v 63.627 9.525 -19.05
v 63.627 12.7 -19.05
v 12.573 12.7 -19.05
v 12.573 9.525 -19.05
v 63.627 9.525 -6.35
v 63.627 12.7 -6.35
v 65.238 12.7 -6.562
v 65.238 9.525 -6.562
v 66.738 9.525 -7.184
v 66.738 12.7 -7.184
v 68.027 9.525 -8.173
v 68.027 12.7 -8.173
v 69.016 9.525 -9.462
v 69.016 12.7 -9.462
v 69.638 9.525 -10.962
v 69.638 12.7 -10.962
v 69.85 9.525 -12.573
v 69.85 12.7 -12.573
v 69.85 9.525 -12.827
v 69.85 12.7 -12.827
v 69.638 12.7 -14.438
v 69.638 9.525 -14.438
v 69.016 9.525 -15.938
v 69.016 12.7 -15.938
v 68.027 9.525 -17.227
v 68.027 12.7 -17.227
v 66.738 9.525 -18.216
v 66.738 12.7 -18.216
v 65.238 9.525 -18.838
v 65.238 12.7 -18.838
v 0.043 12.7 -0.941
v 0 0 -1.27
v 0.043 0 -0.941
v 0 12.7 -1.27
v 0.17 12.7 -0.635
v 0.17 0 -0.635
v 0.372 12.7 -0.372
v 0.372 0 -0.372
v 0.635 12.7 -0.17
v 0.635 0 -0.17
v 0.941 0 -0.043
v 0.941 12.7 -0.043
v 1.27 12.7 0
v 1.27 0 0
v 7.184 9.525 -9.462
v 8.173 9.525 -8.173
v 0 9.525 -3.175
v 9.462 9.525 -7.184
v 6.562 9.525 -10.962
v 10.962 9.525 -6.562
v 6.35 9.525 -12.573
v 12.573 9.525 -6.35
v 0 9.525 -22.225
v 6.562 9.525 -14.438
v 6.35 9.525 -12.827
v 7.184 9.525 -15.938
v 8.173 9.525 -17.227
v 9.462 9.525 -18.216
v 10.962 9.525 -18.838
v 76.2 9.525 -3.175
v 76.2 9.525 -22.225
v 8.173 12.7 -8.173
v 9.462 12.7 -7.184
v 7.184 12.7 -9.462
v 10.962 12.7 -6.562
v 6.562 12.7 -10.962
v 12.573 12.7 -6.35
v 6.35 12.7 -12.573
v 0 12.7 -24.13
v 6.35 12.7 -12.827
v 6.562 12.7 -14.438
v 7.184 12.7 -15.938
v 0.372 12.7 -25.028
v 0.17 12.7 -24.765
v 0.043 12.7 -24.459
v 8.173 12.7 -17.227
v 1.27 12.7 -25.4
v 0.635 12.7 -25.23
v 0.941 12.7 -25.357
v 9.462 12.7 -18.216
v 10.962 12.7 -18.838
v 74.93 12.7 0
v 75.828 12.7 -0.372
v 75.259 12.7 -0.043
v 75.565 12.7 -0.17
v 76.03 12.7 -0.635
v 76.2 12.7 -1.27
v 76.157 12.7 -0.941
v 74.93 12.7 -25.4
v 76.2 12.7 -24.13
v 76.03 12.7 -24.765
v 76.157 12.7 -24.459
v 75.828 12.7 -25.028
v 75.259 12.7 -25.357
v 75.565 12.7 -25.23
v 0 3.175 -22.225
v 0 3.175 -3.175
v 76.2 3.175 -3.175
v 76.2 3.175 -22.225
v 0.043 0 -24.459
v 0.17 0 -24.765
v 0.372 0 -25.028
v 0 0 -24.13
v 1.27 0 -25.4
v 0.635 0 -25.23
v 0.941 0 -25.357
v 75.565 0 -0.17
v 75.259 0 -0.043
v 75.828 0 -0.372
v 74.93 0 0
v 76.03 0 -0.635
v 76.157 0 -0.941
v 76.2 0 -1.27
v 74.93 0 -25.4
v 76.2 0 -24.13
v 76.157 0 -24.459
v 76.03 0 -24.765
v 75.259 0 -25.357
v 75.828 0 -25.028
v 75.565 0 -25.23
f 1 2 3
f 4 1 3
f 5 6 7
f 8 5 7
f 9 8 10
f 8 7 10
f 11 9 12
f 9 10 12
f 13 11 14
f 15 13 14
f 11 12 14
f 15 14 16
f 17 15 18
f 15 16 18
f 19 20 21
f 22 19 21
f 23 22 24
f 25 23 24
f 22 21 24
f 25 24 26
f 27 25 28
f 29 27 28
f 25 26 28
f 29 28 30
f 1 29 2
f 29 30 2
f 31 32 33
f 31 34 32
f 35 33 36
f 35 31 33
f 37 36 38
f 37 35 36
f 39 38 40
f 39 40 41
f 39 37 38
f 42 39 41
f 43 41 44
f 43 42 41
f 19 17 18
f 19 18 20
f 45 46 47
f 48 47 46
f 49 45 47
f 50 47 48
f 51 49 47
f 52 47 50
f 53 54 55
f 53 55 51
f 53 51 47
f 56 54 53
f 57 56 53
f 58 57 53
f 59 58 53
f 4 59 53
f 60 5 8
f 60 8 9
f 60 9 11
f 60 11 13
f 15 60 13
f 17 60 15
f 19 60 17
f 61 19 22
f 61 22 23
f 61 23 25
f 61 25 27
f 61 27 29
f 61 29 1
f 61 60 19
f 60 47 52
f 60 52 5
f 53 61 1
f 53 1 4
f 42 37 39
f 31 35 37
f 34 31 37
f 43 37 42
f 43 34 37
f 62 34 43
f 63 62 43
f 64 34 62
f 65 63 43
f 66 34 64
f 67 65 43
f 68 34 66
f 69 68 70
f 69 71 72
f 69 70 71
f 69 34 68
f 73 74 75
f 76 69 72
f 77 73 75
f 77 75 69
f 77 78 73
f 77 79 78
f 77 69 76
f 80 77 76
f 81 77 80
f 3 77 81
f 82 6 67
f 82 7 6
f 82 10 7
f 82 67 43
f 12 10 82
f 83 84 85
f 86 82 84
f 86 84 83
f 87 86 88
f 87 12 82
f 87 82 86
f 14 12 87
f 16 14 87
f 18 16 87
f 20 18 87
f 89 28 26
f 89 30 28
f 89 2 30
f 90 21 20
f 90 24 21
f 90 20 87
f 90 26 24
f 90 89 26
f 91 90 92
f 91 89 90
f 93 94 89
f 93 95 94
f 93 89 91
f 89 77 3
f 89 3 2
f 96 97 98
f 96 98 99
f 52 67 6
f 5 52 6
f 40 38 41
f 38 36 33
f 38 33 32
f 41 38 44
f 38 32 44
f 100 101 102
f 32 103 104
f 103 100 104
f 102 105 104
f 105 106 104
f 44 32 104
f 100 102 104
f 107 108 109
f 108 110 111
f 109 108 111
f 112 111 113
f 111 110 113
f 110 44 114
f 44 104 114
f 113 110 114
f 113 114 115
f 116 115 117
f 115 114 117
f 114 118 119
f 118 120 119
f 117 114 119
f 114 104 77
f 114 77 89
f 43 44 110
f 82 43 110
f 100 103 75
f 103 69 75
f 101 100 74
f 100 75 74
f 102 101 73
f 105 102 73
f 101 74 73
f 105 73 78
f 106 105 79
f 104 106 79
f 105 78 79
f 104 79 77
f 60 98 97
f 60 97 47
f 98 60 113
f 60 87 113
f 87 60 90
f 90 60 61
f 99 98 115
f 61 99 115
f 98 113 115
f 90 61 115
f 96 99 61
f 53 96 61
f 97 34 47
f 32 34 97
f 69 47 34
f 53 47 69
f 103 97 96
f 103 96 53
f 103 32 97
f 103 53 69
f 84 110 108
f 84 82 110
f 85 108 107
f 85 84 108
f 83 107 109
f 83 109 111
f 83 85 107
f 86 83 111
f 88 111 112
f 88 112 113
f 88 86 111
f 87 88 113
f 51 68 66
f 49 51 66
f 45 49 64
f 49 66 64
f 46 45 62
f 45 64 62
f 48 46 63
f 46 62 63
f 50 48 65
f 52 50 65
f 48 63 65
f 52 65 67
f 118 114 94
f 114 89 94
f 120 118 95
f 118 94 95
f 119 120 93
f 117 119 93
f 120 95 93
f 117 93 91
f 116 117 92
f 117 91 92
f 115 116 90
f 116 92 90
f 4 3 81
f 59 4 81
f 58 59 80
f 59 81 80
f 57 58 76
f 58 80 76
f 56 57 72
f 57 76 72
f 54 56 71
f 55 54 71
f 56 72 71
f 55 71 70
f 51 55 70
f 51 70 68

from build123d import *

# Parameters (mm, degrees)
SKETCH1_W           = 76.2
SKETCH1_H           = 25.4
BOSS_EXTRUDE1_DEPTH = 12.7
SKETCH2_W           = 19.05
SKETCH2_H           = 6.35
CUT_EXTRUDE1_DEPTH  = 82.319677815
CUT_EXTRUDE2_DEPTH  = 3.175
FILLET1_R           = 1.27


with BuildPart() as part:
    # Sketch1 → Boss-Extrude1 (new body)
    with BuildSketch(Plane(origin=(0, 0, 0), x_dir=(1, 0, 0), z_dir=(0, 1, 0))):
        with Locations((38.1, 12.7)):
            Rectangle(SKETCH1_W, SKETCH1_H)
    extrude(amount=BOSS_EXTRUDE1_DEPTH)

    # Sketch2 → Cut-Extrude1 (cut, through all)
    with BuildSketch(Plane(origin=(76.2, 0, 0), x_dir=(0, 0, -1), z_dir=(1, 0, 0))):
        with Locations((12.7, 6.35)):
            Rectangle(SKETCH2_W, SKETCH2_H)
    extrude(amount=-CUT_EXTRUDE1_DEPTH, mode=Mode.SUBTRACT)

    # Sketch3 → Cut-Extrude2 (cut)
    with BuildSketch(Plane(origin=(0, 12.7, 0), x_dir=(1, 0, 0), z_dir=(0, 1, 0))):
        with BuildLine():
            Line((12.573, 6.35), (63.627, 6.35))
            ThreePointArc((63.627, 6.35), (68.027325499, 8.172674501), (69.85, 12.573))
            Line((69.85, 12.573), (69.85, 12.827))
            ThreePointArc((69.85, 12.827), (68.027325499, 17.227325499), (63.627, 19.05))
            Line((63.627, 19.05), (12.573, 19.05))
            ThreePointArc((12.573, 19.05), (8.172674501, 17.227325499), (6.35, 12.827))
            Line((6.35, 12.827), (6.35, 12.573))
            ThreePointArc((6.35, 12.573), (8.172674501, 8.172674501), (12.573, 6.35))
        make_face()
    extrude(amount=-CUT_EXTRUDE2_DEPTH, mode=Mode.SUBTRACT)

    # Fillet1
    fillet1_edges = [part.edges().sort_by_distance(p)[0] for p in [
        (0, 6.35, -25.4),
        (76.2, 6.35, -25.4),
        (76.2, 6.35, 0),
        (0, 6.35, 0),
    ]]
    fillet(fillet1_edges, radius=FILLET1_R)


solid = part.part
